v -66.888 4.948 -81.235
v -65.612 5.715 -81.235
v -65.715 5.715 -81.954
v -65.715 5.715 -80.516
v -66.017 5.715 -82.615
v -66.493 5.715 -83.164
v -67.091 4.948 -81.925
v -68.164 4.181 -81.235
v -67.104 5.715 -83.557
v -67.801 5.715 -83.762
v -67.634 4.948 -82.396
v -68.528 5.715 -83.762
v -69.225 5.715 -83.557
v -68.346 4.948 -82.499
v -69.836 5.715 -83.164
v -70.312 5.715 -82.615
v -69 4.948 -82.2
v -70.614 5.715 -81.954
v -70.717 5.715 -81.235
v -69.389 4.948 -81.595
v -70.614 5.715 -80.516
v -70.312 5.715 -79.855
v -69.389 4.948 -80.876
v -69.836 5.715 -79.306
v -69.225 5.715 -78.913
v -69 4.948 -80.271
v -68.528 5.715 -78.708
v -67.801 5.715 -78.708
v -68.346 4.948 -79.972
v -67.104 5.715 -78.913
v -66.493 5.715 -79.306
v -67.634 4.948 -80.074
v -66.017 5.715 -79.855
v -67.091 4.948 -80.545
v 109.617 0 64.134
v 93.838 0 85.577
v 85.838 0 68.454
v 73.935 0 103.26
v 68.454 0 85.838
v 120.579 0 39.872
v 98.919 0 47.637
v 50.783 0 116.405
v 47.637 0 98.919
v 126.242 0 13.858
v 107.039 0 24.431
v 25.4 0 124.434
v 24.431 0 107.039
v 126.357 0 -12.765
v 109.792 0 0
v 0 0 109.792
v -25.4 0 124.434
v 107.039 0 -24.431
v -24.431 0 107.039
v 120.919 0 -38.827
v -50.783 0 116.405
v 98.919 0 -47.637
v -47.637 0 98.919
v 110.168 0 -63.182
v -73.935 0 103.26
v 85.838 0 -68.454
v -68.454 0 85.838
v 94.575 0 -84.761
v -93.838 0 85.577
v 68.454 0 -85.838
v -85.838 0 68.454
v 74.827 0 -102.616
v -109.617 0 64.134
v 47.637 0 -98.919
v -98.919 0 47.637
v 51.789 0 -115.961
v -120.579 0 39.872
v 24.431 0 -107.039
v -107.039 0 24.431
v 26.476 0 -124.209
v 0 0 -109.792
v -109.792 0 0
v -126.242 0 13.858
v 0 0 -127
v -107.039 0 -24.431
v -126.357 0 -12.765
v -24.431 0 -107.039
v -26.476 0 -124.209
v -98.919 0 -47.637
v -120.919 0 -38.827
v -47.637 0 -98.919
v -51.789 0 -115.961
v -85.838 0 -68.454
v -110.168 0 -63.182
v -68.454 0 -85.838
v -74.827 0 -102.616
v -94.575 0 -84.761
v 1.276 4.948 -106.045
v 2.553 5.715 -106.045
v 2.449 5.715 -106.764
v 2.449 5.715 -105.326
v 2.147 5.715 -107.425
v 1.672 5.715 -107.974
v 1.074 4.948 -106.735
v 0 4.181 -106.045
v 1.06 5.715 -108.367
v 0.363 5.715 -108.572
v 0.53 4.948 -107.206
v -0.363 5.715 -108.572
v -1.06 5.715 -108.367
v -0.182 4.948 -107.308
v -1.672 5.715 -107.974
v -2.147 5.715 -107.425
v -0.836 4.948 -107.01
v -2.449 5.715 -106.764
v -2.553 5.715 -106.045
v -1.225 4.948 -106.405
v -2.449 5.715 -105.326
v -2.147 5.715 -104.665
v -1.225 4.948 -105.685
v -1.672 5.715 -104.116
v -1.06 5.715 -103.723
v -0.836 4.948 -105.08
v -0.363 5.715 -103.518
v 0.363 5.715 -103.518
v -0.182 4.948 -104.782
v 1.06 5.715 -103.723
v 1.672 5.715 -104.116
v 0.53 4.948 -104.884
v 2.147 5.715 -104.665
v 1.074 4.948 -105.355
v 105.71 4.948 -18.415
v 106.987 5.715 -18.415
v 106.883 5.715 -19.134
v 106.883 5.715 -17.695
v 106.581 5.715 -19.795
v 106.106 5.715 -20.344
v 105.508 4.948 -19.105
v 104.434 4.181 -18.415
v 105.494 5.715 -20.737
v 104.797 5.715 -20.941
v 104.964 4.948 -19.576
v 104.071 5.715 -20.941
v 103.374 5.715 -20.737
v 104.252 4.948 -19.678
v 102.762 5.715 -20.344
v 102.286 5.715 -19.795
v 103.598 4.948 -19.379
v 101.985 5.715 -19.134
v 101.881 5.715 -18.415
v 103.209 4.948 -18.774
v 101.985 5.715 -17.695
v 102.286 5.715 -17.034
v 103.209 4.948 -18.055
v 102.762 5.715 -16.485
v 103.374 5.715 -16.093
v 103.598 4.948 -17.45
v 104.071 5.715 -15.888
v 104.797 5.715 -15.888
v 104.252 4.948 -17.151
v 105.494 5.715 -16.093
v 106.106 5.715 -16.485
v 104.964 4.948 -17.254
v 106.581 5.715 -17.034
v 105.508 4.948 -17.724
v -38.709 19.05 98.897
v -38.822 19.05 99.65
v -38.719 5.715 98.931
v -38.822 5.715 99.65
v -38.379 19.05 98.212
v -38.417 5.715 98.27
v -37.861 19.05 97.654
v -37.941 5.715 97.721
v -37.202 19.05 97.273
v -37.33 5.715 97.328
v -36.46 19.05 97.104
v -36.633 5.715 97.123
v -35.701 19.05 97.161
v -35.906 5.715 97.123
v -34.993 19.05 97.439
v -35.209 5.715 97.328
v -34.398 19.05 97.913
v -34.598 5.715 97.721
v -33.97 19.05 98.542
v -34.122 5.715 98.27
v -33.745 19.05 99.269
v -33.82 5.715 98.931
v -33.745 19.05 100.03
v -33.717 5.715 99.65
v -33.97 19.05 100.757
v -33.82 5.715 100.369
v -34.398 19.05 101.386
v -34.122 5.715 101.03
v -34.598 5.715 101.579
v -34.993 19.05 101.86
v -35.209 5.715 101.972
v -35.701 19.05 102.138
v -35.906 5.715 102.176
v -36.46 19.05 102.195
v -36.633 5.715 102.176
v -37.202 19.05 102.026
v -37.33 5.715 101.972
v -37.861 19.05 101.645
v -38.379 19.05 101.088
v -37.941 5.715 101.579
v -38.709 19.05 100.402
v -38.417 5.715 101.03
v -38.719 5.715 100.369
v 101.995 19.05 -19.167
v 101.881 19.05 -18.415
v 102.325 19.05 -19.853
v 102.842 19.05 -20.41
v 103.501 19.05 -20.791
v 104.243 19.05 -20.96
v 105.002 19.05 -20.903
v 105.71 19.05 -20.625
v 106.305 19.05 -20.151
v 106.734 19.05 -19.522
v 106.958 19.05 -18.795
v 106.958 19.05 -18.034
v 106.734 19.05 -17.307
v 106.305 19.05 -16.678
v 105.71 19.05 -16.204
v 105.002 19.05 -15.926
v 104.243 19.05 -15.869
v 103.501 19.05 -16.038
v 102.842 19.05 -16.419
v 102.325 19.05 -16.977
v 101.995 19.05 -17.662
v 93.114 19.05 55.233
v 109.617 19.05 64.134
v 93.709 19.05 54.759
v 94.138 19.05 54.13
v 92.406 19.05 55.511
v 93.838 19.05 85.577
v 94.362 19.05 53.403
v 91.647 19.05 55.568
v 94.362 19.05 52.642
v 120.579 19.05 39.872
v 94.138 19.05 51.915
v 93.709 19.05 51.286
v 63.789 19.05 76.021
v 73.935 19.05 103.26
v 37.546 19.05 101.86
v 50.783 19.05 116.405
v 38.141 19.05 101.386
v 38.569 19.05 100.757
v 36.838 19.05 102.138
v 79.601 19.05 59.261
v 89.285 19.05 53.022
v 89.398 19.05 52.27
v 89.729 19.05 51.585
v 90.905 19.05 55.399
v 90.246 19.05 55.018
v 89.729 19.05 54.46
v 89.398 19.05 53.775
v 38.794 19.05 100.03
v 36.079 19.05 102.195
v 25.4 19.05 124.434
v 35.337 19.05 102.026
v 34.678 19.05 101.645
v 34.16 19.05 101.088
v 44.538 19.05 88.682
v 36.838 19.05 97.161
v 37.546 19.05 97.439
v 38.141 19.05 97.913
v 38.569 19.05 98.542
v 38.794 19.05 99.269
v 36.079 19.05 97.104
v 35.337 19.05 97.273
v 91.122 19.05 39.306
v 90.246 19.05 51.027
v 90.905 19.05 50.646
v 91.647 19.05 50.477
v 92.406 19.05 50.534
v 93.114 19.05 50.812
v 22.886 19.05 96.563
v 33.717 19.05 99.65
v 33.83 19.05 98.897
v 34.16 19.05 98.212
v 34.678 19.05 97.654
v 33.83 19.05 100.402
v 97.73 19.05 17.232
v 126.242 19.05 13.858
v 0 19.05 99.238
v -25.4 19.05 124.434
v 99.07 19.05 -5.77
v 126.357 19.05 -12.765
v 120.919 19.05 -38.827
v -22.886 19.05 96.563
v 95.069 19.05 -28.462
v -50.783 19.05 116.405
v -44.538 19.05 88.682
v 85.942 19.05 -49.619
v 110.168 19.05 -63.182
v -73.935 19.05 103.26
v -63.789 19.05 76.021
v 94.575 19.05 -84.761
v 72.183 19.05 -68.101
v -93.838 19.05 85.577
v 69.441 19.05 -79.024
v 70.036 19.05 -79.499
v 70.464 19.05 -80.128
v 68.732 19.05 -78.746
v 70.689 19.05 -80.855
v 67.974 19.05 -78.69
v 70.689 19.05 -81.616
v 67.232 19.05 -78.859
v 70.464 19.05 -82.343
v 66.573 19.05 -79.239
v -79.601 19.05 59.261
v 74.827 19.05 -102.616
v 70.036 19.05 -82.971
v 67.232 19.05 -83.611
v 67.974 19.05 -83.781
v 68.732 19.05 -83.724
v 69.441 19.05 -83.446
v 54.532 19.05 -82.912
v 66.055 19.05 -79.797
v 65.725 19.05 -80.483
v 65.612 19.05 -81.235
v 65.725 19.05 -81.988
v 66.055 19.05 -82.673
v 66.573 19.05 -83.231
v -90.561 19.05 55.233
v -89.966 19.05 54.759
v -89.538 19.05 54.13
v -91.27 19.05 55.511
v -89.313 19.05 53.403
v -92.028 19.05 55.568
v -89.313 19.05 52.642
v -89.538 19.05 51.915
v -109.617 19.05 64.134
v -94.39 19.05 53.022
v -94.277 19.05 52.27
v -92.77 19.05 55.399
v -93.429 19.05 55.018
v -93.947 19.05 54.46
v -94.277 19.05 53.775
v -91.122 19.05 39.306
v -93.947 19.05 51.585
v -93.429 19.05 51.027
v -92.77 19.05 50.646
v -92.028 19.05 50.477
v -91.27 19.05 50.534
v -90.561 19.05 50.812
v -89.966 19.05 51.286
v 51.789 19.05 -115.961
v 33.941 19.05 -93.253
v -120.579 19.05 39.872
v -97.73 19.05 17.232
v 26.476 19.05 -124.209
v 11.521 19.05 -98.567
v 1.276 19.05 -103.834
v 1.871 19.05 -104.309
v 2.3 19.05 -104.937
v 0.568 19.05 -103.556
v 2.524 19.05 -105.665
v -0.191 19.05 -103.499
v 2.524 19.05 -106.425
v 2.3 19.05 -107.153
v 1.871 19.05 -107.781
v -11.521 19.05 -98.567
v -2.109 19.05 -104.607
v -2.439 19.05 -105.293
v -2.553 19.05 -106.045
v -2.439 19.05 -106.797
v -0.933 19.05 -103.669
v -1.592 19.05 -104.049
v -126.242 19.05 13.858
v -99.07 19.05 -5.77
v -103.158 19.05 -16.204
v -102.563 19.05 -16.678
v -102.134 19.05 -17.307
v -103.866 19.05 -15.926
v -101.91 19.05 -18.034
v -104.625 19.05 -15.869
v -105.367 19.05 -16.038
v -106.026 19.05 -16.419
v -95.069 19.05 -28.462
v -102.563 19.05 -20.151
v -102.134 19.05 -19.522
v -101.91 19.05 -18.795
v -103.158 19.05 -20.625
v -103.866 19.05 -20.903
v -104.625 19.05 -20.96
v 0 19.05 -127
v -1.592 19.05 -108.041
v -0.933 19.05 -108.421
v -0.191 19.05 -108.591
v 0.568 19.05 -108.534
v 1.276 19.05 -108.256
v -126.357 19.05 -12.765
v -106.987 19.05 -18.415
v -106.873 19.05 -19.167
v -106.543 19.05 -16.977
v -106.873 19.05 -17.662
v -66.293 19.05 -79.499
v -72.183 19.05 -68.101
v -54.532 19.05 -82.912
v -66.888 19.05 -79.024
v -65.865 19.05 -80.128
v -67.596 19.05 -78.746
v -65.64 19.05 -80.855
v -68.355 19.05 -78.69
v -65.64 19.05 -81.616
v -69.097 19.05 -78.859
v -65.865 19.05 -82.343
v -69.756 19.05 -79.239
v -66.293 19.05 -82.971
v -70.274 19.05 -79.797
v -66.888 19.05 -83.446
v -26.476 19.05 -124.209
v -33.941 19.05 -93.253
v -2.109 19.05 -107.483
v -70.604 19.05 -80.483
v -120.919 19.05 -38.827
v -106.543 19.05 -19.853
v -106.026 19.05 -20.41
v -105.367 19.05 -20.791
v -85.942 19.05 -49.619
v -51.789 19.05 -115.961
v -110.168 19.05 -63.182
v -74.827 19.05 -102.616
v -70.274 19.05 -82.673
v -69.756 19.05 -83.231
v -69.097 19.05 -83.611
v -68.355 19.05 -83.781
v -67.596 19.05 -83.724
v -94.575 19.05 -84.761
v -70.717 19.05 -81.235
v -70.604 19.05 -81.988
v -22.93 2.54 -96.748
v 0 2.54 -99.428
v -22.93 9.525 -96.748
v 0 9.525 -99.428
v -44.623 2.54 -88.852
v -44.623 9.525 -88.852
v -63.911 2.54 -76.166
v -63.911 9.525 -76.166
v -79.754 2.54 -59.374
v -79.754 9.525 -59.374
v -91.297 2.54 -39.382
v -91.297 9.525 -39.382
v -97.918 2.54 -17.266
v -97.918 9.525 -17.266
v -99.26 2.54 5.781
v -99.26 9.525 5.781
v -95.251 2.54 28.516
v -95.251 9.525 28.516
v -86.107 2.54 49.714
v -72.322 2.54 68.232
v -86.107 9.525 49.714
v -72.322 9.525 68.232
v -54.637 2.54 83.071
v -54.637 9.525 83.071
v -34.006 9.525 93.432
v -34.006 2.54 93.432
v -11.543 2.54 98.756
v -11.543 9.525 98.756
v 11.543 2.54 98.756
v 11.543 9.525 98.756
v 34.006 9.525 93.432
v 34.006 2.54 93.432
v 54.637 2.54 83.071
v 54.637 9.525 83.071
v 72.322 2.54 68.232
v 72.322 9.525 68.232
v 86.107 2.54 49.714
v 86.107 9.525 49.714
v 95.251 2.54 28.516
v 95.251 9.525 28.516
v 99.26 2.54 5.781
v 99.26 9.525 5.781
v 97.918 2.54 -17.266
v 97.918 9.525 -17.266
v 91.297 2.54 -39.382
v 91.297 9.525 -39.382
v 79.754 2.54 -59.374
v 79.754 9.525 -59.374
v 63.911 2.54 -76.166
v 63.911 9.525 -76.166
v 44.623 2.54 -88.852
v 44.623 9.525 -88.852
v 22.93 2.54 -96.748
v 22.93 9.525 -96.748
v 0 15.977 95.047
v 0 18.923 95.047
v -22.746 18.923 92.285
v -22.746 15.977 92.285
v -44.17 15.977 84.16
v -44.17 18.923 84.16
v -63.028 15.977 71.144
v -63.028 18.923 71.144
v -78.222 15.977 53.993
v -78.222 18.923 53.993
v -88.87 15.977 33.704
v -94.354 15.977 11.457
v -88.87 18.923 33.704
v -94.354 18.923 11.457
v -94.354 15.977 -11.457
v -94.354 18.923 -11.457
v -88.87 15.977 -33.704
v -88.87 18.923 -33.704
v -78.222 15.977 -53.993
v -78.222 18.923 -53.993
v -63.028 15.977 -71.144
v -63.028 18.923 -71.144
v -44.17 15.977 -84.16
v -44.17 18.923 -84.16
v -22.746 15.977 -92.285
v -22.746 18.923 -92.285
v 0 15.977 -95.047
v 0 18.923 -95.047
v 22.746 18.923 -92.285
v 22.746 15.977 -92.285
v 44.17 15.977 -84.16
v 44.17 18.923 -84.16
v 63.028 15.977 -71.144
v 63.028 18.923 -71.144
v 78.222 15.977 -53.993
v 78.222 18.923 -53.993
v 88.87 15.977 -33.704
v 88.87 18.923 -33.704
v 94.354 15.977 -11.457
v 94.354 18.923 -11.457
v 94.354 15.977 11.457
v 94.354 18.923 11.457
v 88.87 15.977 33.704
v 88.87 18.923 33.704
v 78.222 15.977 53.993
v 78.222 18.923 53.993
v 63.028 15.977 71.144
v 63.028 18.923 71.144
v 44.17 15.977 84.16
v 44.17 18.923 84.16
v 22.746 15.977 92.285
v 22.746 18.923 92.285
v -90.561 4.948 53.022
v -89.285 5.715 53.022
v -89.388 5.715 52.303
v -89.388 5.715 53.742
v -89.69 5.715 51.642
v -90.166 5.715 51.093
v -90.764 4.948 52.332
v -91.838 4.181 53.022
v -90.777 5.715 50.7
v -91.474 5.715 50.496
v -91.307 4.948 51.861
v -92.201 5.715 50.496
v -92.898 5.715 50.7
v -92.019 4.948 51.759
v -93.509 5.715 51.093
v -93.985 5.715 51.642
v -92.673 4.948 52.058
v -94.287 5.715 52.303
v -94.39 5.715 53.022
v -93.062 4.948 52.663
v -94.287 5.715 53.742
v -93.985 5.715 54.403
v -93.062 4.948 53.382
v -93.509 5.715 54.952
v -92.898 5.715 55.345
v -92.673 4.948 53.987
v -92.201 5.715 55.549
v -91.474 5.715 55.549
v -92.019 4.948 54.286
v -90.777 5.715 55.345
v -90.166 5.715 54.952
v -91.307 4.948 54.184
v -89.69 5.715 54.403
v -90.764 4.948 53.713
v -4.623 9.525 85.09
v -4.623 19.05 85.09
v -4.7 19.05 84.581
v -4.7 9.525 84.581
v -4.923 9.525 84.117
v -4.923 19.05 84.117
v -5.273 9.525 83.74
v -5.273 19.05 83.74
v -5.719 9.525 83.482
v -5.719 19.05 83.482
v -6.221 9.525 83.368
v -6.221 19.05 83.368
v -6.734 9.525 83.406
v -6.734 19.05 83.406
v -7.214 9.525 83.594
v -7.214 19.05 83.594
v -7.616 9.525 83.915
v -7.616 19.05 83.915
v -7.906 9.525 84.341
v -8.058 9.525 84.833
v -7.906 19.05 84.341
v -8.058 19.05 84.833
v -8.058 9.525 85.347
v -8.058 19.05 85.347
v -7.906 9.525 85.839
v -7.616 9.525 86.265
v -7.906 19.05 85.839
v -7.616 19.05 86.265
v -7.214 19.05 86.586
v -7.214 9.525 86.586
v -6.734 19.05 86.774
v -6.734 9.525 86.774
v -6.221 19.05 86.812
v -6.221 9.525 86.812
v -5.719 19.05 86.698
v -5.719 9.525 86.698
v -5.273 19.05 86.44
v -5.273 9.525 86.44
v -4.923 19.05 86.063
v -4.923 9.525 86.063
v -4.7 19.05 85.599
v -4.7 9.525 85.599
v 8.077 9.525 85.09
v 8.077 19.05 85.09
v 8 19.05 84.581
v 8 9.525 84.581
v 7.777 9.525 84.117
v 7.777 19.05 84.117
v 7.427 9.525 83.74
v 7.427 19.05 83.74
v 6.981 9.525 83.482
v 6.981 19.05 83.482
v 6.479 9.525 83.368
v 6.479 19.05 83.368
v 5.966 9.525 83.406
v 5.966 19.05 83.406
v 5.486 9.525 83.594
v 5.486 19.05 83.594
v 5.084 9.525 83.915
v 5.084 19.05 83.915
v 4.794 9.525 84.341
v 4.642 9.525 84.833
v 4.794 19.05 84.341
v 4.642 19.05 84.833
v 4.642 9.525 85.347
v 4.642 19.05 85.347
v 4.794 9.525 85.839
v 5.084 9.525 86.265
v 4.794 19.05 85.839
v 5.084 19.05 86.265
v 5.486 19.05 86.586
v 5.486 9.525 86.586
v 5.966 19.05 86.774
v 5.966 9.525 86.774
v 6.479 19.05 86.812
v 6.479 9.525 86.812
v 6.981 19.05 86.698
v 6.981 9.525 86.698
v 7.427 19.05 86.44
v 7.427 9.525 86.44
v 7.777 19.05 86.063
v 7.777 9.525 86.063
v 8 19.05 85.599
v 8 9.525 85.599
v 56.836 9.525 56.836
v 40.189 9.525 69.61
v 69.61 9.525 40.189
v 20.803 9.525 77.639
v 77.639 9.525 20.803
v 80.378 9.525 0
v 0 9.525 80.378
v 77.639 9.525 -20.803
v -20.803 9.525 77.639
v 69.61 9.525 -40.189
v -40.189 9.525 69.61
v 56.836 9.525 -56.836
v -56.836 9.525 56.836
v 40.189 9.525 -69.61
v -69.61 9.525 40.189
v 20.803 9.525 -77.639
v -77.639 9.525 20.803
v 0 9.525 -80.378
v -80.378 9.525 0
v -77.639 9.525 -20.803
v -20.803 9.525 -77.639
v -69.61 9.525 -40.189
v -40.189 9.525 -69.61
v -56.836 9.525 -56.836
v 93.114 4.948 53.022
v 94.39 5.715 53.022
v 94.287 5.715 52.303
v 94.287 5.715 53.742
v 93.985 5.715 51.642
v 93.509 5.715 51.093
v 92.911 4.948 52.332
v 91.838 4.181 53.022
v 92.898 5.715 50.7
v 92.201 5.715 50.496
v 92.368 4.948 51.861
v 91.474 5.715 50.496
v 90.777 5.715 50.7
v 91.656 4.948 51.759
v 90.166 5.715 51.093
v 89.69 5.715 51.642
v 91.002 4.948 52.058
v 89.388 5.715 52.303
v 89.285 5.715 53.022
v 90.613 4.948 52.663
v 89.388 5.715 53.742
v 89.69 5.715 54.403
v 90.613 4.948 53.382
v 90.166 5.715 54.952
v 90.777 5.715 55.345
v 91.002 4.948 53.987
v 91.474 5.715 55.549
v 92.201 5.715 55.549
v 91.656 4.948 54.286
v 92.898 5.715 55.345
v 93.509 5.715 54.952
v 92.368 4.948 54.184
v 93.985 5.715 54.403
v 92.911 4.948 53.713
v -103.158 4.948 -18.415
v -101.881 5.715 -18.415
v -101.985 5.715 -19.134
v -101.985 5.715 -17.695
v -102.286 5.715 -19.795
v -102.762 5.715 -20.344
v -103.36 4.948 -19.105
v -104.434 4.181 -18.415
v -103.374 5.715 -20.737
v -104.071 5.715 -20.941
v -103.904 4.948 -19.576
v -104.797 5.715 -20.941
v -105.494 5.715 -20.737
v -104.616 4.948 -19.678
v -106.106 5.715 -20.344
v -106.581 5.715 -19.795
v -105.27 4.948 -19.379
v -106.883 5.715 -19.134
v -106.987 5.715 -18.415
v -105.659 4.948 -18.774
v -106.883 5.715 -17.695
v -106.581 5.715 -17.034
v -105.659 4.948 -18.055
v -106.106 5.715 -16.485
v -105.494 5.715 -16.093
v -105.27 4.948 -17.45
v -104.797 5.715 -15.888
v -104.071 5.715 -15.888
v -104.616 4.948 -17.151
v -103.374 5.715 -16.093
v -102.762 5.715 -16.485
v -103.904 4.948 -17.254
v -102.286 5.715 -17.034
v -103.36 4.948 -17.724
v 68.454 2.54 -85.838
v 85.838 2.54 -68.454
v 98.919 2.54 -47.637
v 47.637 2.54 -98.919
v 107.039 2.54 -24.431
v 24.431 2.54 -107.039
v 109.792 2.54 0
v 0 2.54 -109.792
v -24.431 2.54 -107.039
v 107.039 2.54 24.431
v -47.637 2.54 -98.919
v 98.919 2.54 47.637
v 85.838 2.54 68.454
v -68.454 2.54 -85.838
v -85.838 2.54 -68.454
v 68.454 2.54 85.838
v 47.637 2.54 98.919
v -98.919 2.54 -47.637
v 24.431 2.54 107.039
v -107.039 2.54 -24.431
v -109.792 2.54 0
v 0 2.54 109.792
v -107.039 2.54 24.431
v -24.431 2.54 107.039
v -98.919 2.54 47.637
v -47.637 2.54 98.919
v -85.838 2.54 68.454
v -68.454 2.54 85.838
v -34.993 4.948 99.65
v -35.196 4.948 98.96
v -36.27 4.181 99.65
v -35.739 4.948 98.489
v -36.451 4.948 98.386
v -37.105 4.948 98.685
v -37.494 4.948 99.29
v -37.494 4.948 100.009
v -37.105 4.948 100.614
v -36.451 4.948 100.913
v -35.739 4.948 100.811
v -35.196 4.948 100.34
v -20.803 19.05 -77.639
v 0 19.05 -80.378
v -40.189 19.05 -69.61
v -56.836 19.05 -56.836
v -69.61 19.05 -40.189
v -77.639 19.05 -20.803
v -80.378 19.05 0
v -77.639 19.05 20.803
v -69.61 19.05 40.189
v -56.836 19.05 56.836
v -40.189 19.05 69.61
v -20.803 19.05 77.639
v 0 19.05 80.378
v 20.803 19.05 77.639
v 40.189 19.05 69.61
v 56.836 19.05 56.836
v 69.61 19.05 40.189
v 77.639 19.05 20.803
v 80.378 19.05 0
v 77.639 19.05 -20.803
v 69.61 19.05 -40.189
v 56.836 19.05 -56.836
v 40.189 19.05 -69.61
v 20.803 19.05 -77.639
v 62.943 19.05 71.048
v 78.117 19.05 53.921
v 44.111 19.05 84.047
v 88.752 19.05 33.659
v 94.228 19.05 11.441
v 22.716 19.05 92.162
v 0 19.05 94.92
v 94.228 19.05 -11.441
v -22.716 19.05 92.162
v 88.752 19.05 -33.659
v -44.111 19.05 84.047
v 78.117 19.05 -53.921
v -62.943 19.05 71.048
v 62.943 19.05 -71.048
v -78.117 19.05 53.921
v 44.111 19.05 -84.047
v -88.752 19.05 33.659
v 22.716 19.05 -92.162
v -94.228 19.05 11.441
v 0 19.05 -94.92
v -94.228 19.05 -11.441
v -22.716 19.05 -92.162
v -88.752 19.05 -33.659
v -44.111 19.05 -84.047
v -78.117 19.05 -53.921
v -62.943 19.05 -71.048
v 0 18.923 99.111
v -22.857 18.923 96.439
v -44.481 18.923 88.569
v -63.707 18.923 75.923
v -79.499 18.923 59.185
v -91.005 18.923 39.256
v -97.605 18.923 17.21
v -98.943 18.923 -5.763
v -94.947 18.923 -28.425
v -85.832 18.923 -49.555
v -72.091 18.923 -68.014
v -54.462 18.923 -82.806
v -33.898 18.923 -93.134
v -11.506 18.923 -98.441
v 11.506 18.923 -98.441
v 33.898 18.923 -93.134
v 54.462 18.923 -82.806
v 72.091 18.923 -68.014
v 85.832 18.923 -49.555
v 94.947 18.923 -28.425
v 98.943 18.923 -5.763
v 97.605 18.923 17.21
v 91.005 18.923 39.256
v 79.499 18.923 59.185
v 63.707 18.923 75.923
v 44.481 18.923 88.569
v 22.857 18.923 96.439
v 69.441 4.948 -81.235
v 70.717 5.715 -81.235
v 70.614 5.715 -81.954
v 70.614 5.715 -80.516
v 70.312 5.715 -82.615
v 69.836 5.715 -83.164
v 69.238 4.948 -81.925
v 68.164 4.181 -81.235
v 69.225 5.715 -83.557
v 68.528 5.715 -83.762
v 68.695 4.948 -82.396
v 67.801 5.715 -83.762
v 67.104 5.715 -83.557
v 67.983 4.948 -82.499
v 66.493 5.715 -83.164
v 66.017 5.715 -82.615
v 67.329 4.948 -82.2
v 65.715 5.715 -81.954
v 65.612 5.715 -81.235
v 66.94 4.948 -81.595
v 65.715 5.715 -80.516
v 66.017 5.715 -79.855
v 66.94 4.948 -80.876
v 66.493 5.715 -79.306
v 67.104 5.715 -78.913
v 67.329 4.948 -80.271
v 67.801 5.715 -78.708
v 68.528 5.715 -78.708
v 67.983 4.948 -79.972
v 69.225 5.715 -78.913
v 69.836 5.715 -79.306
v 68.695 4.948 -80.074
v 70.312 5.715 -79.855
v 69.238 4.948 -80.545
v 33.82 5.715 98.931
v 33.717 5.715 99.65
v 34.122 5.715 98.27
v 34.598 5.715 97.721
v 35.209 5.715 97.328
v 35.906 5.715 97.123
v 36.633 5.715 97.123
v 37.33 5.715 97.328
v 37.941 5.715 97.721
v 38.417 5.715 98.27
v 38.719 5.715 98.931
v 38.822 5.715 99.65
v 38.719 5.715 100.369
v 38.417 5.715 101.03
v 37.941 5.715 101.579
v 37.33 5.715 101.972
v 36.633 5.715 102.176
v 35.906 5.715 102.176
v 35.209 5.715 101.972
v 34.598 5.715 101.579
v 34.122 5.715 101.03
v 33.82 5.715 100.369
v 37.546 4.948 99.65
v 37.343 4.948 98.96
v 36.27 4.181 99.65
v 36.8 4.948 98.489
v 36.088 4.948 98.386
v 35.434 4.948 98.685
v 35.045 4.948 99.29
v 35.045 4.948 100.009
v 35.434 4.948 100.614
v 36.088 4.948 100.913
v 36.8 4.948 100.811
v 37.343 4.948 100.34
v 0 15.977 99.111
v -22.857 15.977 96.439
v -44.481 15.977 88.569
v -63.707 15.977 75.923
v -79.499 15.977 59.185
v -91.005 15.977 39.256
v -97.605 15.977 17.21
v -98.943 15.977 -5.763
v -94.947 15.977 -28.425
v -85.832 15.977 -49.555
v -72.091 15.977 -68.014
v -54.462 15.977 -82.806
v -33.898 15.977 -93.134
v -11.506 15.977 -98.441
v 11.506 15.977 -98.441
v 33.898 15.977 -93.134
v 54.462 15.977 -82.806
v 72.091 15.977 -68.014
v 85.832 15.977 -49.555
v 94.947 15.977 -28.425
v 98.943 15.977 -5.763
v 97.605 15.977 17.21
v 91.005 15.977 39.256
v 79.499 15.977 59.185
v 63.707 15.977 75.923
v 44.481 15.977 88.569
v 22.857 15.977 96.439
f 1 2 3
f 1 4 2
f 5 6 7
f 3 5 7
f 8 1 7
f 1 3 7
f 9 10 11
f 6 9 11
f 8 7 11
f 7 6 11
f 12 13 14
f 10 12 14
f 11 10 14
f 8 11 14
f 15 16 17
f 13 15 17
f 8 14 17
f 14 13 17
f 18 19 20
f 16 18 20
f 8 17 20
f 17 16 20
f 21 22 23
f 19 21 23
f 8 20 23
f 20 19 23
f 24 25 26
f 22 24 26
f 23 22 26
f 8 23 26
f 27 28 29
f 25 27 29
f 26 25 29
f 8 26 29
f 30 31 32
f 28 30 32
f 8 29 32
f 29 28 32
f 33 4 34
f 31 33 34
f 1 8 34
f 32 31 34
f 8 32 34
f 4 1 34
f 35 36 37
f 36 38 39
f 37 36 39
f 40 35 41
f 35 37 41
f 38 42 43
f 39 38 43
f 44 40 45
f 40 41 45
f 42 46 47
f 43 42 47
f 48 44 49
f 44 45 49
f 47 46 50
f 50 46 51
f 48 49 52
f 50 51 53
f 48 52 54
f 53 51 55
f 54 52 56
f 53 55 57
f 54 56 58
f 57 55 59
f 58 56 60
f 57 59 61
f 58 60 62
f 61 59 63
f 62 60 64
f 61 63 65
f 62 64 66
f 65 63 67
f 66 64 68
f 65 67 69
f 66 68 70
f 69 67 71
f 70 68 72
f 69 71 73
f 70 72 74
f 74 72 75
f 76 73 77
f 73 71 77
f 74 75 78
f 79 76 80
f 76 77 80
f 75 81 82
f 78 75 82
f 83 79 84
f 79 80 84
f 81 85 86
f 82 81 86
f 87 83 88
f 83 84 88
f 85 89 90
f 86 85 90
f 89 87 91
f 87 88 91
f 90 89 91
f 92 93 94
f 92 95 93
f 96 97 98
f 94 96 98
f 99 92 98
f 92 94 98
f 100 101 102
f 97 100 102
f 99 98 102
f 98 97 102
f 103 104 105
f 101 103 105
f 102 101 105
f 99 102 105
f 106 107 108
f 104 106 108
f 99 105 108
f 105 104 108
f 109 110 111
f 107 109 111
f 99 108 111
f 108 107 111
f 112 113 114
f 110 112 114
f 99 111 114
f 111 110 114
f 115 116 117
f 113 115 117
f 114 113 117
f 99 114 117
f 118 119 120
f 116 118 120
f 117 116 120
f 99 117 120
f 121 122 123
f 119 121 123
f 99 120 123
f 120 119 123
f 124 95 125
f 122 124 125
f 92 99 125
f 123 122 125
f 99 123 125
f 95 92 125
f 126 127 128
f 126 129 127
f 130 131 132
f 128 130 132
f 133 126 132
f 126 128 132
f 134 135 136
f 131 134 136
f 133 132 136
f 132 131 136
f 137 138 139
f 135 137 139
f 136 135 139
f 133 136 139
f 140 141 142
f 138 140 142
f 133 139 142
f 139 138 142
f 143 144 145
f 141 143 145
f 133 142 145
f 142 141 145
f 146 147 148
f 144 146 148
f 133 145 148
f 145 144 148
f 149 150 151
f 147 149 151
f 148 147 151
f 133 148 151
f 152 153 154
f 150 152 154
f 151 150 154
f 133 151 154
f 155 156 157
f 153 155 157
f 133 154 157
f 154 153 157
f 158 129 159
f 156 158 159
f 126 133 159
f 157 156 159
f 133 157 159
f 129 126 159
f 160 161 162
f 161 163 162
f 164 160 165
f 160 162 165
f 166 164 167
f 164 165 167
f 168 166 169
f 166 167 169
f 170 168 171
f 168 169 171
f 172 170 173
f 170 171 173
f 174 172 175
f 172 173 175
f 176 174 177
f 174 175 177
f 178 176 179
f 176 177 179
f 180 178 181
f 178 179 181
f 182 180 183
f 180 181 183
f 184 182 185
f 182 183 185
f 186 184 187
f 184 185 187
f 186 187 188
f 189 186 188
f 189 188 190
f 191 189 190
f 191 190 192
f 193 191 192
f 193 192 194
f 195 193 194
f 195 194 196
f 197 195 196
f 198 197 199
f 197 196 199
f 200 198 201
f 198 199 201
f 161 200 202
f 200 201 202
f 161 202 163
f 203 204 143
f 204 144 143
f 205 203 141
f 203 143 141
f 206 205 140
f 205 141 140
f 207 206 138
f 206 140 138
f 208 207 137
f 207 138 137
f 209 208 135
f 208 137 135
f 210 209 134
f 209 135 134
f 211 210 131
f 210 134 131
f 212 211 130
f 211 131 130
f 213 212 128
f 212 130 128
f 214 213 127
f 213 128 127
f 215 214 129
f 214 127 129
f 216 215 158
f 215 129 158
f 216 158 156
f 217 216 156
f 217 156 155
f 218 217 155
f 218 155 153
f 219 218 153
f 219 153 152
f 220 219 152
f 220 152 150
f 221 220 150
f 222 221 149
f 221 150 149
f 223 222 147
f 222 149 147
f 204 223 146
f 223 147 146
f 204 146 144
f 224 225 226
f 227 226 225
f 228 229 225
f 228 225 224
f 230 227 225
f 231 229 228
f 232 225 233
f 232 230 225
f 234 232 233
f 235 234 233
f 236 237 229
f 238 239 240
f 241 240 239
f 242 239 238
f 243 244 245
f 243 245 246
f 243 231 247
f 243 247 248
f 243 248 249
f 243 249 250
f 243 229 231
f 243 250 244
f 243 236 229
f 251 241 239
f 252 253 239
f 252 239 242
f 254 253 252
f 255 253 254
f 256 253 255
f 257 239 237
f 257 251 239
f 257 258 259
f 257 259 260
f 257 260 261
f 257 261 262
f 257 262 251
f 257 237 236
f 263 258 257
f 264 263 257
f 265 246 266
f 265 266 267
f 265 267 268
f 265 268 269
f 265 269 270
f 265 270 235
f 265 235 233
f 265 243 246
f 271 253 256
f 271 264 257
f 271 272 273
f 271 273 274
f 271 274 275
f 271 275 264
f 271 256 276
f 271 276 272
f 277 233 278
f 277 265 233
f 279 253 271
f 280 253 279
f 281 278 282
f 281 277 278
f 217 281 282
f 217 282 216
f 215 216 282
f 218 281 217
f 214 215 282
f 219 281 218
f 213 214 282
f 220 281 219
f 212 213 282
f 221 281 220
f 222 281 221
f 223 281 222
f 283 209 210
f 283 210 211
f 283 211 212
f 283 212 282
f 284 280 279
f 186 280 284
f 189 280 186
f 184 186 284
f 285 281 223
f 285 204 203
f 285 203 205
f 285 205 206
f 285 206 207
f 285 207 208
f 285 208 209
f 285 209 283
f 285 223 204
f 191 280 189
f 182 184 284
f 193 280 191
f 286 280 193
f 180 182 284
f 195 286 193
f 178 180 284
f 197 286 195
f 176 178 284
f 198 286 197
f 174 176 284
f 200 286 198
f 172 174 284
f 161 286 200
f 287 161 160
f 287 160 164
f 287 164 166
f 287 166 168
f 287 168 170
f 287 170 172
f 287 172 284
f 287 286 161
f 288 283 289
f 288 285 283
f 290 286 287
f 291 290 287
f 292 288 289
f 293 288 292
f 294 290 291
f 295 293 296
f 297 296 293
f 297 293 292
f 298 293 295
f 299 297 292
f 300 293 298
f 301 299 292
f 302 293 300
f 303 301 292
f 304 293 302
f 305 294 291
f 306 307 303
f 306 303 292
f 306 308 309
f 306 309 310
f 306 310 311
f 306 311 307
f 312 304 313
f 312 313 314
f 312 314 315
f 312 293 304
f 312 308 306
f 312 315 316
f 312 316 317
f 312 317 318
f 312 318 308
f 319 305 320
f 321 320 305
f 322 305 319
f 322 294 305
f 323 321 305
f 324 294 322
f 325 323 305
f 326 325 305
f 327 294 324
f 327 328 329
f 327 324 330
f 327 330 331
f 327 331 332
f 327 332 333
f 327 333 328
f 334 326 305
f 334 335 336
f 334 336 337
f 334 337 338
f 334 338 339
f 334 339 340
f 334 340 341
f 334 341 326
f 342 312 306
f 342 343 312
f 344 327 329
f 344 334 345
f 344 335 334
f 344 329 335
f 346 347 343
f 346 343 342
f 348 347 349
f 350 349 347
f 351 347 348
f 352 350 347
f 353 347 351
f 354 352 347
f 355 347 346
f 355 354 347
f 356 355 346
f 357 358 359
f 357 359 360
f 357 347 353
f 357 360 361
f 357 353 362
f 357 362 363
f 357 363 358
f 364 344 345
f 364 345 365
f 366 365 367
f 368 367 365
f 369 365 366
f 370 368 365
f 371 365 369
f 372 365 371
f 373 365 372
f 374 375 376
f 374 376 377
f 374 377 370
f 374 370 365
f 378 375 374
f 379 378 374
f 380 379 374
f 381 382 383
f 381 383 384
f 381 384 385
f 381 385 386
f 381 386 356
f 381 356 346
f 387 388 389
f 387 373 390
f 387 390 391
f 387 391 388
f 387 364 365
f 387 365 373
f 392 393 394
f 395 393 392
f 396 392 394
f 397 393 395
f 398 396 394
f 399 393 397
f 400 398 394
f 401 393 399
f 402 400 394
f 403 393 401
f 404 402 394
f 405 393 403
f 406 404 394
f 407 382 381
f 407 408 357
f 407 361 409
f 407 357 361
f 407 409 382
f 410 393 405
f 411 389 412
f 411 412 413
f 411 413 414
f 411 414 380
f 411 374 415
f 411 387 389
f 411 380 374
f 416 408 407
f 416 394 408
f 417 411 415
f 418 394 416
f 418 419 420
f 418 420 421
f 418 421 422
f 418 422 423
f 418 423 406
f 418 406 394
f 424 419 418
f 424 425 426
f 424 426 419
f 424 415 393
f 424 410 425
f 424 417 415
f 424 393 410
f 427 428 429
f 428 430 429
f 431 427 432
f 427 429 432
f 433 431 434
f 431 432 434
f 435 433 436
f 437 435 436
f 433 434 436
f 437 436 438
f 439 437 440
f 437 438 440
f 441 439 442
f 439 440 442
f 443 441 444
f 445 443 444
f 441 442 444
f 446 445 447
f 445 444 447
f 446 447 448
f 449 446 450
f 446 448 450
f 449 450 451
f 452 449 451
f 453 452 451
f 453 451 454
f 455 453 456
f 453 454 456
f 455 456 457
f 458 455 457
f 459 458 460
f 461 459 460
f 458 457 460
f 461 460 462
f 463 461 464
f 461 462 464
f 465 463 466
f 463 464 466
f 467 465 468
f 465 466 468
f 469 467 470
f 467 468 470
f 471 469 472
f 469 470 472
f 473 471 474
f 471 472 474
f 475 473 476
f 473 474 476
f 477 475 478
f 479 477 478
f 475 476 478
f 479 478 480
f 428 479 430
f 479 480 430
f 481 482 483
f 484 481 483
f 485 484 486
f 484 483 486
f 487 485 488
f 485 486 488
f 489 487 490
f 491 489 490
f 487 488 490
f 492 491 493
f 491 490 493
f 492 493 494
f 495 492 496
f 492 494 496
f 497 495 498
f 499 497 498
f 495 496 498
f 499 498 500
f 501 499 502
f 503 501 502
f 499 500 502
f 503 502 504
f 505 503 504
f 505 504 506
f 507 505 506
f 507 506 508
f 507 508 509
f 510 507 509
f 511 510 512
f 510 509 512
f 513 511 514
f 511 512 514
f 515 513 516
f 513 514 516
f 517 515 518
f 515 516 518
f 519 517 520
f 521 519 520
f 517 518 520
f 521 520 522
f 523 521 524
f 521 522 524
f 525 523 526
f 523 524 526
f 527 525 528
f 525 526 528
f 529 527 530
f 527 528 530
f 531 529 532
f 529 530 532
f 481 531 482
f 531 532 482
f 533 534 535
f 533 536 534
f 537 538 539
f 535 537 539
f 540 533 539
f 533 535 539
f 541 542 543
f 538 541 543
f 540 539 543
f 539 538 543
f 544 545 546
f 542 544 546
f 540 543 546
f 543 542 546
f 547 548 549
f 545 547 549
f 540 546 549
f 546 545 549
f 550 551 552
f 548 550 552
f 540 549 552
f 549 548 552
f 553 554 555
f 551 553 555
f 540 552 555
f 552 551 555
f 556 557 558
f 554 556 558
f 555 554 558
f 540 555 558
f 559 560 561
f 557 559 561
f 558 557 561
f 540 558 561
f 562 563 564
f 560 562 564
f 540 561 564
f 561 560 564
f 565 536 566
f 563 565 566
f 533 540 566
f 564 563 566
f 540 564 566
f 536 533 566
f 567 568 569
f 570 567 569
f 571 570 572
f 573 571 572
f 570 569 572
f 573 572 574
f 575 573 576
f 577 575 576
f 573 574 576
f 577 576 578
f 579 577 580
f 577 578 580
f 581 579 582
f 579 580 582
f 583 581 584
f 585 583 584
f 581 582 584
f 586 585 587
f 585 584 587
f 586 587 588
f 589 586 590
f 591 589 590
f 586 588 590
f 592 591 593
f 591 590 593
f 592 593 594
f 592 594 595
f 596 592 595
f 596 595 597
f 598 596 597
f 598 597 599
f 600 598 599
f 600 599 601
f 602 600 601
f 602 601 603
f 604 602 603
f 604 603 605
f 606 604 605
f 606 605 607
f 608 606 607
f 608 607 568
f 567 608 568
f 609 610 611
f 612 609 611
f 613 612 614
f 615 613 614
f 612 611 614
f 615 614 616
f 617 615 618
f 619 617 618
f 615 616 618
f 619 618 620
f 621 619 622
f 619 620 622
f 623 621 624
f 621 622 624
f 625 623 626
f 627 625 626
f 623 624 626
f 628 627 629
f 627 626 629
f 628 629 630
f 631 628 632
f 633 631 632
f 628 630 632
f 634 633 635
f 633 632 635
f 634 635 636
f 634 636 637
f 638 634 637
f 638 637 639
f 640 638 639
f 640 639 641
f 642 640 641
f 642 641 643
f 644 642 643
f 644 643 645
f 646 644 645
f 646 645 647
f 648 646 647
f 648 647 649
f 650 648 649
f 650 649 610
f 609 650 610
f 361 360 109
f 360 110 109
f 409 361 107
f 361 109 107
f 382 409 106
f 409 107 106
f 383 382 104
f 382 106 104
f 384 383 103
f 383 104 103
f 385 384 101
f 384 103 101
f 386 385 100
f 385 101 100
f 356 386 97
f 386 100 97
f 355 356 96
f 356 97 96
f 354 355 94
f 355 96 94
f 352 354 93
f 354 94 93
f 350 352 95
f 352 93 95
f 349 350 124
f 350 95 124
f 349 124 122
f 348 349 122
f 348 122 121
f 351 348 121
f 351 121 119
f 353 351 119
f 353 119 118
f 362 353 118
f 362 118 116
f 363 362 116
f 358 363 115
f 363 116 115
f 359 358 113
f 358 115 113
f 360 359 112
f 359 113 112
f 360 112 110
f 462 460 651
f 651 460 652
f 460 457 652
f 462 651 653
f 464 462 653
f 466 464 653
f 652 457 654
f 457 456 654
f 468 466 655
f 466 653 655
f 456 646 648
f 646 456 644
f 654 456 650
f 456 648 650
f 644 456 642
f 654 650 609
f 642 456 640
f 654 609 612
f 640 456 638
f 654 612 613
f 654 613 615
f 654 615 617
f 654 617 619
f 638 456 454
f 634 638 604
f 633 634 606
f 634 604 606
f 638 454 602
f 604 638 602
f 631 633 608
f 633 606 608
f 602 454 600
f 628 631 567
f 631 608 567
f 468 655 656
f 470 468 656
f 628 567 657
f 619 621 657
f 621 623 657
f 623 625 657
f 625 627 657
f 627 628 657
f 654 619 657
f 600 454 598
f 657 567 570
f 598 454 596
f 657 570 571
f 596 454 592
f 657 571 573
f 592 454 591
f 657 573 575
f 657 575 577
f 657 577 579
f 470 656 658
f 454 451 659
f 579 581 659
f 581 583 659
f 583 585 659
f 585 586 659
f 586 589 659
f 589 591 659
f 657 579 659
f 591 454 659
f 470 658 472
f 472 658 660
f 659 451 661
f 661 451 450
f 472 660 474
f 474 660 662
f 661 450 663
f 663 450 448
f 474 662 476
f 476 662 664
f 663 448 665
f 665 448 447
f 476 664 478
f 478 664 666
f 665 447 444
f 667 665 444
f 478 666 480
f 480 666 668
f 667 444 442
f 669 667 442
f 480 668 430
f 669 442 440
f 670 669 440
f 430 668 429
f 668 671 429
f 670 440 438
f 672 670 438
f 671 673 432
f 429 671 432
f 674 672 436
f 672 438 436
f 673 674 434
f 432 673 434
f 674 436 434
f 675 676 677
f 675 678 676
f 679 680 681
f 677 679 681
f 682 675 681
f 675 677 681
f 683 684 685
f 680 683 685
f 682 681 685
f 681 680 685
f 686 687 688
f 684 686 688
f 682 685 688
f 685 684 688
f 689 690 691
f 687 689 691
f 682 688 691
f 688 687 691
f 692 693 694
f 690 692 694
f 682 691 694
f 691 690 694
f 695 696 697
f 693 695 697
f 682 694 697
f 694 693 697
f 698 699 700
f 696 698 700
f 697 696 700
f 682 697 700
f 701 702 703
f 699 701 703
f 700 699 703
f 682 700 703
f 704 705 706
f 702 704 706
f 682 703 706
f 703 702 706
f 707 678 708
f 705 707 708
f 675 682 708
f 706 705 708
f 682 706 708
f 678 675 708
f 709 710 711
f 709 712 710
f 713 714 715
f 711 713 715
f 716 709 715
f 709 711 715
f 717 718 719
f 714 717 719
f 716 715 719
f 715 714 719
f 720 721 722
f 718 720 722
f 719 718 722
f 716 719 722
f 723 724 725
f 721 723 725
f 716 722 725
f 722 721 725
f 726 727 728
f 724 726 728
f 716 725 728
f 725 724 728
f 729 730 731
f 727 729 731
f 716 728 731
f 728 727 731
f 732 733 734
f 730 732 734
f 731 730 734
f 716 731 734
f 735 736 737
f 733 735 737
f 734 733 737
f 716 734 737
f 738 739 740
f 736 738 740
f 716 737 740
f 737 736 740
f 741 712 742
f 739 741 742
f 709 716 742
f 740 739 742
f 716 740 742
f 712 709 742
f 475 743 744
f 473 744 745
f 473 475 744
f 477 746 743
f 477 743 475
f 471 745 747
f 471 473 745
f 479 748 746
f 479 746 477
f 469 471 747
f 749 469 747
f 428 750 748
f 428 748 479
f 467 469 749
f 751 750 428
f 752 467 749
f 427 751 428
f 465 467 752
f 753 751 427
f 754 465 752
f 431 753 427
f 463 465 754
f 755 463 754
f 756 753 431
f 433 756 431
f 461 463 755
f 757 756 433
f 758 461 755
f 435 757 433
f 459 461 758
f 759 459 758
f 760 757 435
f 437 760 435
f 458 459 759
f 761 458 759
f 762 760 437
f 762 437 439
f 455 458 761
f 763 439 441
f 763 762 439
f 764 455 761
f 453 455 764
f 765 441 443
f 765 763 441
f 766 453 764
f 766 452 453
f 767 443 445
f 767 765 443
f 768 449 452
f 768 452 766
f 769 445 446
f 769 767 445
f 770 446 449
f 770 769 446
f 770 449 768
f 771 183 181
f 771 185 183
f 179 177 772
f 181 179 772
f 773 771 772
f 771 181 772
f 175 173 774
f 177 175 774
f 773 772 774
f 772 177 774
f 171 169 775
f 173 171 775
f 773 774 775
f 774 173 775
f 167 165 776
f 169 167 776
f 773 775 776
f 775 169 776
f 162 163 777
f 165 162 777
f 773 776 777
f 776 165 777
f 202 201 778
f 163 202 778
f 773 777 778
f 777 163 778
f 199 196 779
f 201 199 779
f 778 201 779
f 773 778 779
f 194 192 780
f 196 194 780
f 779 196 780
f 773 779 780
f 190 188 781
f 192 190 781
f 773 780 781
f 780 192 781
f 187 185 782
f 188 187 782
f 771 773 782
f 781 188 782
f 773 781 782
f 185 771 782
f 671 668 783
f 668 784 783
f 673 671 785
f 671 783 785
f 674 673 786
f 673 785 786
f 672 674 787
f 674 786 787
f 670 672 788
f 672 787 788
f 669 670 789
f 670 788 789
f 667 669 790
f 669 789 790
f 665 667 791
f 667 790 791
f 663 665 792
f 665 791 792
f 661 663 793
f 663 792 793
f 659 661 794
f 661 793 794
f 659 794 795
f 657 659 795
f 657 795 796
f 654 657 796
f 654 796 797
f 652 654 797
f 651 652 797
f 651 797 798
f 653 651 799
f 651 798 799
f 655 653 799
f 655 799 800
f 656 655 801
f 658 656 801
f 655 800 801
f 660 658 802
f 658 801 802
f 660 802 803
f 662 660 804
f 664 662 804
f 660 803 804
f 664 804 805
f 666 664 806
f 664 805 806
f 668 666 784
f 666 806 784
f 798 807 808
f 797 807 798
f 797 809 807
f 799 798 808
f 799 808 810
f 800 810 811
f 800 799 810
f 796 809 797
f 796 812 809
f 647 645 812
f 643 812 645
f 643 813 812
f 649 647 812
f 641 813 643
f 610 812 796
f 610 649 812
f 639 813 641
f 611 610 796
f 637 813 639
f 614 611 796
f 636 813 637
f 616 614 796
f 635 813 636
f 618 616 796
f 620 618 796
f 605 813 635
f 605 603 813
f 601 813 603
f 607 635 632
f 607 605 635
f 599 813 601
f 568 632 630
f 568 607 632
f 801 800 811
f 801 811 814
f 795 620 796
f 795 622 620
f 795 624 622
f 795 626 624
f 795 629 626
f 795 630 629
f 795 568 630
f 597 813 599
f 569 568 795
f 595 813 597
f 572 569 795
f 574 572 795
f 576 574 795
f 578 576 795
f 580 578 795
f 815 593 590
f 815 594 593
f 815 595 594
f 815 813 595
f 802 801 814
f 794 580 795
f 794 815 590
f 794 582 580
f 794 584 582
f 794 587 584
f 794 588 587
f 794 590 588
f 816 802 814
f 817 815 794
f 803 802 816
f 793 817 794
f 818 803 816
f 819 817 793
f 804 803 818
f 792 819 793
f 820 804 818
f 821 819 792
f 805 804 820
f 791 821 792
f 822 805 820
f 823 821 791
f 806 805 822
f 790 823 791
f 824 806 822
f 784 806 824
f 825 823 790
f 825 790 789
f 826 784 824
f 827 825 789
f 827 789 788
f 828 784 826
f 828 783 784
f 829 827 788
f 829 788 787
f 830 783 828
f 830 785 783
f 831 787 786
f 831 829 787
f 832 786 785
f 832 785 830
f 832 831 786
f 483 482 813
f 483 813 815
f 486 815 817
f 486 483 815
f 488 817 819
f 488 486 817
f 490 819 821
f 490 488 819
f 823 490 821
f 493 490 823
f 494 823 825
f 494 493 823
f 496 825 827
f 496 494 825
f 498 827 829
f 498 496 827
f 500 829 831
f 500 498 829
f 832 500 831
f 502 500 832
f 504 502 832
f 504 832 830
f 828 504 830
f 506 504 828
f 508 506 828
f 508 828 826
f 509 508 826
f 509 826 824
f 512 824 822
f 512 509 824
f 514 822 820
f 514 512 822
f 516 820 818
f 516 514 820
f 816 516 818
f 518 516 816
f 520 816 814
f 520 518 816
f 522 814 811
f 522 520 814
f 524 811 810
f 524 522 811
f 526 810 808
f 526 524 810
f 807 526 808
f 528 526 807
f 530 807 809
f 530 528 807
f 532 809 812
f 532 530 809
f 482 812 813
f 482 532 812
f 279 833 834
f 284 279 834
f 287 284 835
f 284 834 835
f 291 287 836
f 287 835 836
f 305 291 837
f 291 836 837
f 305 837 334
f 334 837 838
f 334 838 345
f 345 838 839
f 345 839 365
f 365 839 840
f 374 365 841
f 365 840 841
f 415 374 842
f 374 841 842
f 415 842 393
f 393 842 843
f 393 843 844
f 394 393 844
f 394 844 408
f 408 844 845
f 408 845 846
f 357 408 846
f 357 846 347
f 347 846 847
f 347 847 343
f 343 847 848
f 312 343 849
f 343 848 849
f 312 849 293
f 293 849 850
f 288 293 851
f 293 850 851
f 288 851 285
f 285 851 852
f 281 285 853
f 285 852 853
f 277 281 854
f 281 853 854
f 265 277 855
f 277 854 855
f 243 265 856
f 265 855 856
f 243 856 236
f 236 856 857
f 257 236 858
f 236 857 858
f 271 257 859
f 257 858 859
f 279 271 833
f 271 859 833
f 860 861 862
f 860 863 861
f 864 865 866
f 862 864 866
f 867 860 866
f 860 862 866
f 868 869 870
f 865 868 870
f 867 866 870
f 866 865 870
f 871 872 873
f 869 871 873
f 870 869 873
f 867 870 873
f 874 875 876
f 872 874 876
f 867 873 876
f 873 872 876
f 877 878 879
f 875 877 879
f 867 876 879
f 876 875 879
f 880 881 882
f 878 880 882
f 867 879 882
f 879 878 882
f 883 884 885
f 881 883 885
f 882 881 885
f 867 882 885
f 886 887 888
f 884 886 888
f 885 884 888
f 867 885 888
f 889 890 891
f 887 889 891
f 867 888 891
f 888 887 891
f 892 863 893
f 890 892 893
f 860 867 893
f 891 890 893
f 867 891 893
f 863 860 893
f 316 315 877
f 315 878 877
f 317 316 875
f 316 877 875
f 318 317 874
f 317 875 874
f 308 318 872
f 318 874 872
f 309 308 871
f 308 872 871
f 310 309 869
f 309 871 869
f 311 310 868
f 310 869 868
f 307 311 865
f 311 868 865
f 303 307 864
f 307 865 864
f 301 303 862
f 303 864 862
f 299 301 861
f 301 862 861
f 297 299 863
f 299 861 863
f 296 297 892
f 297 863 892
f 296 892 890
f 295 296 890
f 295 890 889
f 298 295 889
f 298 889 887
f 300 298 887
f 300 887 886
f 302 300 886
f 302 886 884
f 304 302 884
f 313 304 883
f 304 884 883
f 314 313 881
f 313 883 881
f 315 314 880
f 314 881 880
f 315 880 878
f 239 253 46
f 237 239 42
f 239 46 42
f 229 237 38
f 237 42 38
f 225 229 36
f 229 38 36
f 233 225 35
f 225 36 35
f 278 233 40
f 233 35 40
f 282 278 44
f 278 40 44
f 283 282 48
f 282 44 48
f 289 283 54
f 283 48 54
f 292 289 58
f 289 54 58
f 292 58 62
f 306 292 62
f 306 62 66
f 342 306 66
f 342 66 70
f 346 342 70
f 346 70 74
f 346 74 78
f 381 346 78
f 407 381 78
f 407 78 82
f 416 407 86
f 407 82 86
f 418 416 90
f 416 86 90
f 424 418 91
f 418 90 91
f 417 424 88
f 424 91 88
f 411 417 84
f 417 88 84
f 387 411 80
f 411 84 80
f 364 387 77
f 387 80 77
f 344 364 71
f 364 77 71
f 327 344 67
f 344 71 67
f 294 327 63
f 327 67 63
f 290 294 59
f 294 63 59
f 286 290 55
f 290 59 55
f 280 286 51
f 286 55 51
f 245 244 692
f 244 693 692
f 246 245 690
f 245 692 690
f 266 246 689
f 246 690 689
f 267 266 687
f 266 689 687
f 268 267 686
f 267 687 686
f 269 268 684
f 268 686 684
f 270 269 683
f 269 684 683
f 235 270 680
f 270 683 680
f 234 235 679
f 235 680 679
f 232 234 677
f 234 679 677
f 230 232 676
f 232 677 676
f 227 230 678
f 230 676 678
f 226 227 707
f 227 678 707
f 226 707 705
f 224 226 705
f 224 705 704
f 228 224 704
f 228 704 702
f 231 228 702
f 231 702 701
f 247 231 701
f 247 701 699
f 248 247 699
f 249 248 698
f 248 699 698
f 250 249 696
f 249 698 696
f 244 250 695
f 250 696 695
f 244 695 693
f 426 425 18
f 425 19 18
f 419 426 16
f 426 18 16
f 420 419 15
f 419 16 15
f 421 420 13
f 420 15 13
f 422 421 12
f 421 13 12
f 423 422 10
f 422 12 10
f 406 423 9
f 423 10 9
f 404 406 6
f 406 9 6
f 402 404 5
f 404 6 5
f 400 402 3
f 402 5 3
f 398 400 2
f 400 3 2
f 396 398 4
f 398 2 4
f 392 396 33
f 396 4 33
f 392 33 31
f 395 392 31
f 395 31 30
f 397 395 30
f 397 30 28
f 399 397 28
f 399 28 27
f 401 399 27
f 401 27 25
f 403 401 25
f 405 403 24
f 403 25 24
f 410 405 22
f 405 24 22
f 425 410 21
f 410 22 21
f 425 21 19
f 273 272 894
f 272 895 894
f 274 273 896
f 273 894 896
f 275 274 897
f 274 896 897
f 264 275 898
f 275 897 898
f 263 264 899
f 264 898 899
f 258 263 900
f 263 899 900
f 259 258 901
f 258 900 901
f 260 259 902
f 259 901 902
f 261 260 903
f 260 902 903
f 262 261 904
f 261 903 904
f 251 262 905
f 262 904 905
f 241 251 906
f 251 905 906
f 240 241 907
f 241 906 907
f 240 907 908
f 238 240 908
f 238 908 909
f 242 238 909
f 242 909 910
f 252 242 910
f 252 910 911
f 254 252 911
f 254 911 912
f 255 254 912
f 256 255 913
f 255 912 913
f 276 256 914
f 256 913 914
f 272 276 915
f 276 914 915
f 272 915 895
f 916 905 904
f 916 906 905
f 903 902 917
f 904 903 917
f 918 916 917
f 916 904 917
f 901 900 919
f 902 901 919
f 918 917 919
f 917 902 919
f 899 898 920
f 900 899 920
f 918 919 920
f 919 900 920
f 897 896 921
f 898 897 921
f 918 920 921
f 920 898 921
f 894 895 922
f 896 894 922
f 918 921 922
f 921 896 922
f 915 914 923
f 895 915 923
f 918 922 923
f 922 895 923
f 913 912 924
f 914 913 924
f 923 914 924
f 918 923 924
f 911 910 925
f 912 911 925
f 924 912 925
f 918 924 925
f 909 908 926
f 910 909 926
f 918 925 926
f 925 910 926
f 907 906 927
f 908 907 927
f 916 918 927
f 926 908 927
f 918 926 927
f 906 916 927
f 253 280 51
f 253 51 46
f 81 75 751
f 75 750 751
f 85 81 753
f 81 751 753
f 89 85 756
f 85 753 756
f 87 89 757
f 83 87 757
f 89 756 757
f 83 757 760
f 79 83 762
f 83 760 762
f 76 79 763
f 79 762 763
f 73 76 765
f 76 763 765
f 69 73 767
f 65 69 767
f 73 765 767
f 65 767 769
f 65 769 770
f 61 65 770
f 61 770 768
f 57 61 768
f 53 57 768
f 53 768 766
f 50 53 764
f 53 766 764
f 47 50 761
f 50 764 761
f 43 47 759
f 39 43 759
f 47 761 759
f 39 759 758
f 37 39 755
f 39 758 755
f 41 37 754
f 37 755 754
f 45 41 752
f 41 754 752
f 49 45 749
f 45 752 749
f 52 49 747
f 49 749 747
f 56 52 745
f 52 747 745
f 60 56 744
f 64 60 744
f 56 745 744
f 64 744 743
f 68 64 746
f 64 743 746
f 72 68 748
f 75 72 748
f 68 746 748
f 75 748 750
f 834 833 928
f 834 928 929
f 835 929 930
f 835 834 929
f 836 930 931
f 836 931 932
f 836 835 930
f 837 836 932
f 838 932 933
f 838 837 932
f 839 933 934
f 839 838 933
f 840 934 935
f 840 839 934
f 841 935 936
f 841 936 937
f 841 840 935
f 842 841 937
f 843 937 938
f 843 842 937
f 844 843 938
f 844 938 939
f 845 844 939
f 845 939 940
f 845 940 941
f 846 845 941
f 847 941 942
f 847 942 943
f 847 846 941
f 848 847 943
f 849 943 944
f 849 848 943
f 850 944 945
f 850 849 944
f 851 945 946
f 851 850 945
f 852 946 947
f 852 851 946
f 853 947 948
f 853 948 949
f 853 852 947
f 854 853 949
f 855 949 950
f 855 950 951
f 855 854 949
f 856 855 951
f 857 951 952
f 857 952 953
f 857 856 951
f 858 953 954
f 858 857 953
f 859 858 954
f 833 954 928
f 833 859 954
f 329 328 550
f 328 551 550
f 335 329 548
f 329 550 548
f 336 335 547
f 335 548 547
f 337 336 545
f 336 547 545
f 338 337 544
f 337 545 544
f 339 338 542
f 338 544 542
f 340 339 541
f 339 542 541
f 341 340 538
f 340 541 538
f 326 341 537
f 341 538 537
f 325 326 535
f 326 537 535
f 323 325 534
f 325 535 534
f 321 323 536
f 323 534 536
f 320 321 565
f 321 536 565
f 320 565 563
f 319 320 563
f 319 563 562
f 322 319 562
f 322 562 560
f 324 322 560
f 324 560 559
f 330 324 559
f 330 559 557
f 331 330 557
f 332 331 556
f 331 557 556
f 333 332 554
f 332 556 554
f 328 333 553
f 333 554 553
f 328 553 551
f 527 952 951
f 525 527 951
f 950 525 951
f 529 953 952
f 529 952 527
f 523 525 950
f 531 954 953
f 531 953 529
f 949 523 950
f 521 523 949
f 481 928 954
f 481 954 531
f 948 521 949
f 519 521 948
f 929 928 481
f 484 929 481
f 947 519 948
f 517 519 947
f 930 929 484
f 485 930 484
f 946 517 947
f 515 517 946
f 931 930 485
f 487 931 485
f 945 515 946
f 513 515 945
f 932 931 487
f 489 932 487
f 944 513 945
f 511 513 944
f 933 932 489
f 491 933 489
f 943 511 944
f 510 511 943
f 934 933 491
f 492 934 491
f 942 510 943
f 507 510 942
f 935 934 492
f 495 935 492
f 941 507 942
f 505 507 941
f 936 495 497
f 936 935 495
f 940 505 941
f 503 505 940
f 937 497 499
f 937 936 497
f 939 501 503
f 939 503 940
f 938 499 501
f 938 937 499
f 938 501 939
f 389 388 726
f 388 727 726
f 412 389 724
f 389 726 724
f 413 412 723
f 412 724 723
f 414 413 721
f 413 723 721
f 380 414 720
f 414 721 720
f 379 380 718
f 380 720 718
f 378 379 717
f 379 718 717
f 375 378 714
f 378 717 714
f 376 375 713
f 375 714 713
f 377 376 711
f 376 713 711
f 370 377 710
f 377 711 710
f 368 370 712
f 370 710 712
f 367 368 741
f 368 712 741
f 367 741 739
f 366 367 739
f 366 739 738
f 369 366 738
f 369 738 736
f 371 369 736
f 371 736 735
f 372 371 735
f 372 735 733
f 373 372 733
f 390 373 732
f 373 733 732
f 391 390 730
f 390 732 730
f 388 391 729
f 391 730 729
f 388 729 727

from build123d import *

# Parameters (mm, degrees)
F_1_4_20_TAPPED_HOLE1_D     = 5.1054
F_1_4_20_TAPPED_HOLE1_DEPTH = 13.335
F_1_4_20_TAPPED_HOLE1_TIP   = 1.533816902
SKETCH4_W                   = 4.064
SKETCH4_H                   = 3.0734
CHAMFER1_SIZE               = 0.127
F_8_32_TAPPED_HOLE1_D       = 3.4544
CUT_EXTRUDE1_REACH          = 182.613
SKETCH7_W                   = 50.8
SKETCH7_H                   = 2.565921067


with BuildPart() as part:
    # Sketch1 → Revolve1 (revolve)
    with BuildSketch(Plane.XY, mode=Mode.PRIVATE) as revolve1_sk:
        Polygon((109.7915, 0), (109.7915, 2.54), (105.7783, 2.54), (99.4283, 2.54), (99.4283, 9.525), (80.3783, 9.525), (80.3783, 19.05), (105.7783, 19.05), (127, 19.05), (127, 0), align=None)
    revolve(revolve1_sk.sketch.rotate(Axis((0, 0, 0), (0, 1, 0)), 90), axis=Axis((0, 0, 0), (0, 1, 0)))

    # 1/4-20 Tapped Hole1
    with Locations(Plane(origin=(0, 19.05, 0), x_dir=(1, 0, 0), z_dir=(0, 1, 0))):
        with Locations((0, 106.045), (68.164412069, 81.235182971), (104.433938168, 18.414521001), (91.837663944, -53.0225), (36.269526099, -99.649703971), (-36.269526099, -99.649703971), (-91.837663944, -53.0225), (-104.433938168, 18.414521001), (-68.164412069, 81.235182971)):
            Hole(F_1_4_20_TAPPED_HOLE1_D / 2, depth=F_1_4_20_TAPPED_HOLE1_DEPTH)
            with Locations((0, 0, -(F_1_4_20_TAPPED_HOLE1_DEPTH + F_1_4_20_TAPPED_HOLE1_TIP / 2))):  # 118° drill point
                Cone(0, F_1_4_20_TAPPED_HOLE1_D / 2, F_1_4_20_TAPPED_HOLE1_TIP, mode=Mode.SUBTRACT)

    # Sketch4 → Cut-Revolve1 (revolve, cut)
    with BuildSketch(Plane.XY, mode=Mode.PRIVATE) as cut_revolve1_sk:
        with Locations((97.0788, 17.5133)):
            Rectangle(SKETCH4_W, SKETCH4_H)
    revolve(cut_revolve1_sk.sketch.rotate(Axis((0, 19.05, 0), (0, -1, 0)), 90), axis=Axis((0, 19.05, 0), (0, -1, 0)), mode=Mode.SUBTRACT)

    # Chamfer1
    chamfer1_edges = [part.edges().sort_by_distance(p)[0] for p in [
        (0, 19.05, -95.0468),
        (0, 19.05, -99.1108),
    ]]
    chamfer(chamfer1_edges, length=CHAMFER1_SIZE)

    # #8-32 Tapped Hole1 (through all)
    with Locations(Plane(origin=(0, 9.525, 0), x_dir=(-1, 0, 0), z_dir=(0, -1, 0))):
        with Locations((6.35, -85.09), (-6.35, -85.09)):
            Hole(F_8_32_TAPPED_HOLE1_D / 2)

    # Sketch7 → Cut-Extrude1 (cut, up to next)
    with BuildSketch(Plane(origin=(0, 19.05, 0), x_dir=(1, 0, 0), z_dir=(0, 1, 0)), mode=Mode.PRIVATE) as cut_extrude1_sk1:
        with Locations((0, -125.717039467)):
            Rectangle(SKETCH7_W, SKETCH7_H)
    cut_extrude1_tool1 = extrude(cut_extrude1_sk1.sketch, amount=-CUT_EXTRUDE1_REACH, mode=Mode.PRIVATE) & part.part
    add(cut_extrude1_tool1.solids().sort_by_distance((0, 19.05, 125.717039))[0], mode=Mode.SUBTRACT)


solid = part.part
